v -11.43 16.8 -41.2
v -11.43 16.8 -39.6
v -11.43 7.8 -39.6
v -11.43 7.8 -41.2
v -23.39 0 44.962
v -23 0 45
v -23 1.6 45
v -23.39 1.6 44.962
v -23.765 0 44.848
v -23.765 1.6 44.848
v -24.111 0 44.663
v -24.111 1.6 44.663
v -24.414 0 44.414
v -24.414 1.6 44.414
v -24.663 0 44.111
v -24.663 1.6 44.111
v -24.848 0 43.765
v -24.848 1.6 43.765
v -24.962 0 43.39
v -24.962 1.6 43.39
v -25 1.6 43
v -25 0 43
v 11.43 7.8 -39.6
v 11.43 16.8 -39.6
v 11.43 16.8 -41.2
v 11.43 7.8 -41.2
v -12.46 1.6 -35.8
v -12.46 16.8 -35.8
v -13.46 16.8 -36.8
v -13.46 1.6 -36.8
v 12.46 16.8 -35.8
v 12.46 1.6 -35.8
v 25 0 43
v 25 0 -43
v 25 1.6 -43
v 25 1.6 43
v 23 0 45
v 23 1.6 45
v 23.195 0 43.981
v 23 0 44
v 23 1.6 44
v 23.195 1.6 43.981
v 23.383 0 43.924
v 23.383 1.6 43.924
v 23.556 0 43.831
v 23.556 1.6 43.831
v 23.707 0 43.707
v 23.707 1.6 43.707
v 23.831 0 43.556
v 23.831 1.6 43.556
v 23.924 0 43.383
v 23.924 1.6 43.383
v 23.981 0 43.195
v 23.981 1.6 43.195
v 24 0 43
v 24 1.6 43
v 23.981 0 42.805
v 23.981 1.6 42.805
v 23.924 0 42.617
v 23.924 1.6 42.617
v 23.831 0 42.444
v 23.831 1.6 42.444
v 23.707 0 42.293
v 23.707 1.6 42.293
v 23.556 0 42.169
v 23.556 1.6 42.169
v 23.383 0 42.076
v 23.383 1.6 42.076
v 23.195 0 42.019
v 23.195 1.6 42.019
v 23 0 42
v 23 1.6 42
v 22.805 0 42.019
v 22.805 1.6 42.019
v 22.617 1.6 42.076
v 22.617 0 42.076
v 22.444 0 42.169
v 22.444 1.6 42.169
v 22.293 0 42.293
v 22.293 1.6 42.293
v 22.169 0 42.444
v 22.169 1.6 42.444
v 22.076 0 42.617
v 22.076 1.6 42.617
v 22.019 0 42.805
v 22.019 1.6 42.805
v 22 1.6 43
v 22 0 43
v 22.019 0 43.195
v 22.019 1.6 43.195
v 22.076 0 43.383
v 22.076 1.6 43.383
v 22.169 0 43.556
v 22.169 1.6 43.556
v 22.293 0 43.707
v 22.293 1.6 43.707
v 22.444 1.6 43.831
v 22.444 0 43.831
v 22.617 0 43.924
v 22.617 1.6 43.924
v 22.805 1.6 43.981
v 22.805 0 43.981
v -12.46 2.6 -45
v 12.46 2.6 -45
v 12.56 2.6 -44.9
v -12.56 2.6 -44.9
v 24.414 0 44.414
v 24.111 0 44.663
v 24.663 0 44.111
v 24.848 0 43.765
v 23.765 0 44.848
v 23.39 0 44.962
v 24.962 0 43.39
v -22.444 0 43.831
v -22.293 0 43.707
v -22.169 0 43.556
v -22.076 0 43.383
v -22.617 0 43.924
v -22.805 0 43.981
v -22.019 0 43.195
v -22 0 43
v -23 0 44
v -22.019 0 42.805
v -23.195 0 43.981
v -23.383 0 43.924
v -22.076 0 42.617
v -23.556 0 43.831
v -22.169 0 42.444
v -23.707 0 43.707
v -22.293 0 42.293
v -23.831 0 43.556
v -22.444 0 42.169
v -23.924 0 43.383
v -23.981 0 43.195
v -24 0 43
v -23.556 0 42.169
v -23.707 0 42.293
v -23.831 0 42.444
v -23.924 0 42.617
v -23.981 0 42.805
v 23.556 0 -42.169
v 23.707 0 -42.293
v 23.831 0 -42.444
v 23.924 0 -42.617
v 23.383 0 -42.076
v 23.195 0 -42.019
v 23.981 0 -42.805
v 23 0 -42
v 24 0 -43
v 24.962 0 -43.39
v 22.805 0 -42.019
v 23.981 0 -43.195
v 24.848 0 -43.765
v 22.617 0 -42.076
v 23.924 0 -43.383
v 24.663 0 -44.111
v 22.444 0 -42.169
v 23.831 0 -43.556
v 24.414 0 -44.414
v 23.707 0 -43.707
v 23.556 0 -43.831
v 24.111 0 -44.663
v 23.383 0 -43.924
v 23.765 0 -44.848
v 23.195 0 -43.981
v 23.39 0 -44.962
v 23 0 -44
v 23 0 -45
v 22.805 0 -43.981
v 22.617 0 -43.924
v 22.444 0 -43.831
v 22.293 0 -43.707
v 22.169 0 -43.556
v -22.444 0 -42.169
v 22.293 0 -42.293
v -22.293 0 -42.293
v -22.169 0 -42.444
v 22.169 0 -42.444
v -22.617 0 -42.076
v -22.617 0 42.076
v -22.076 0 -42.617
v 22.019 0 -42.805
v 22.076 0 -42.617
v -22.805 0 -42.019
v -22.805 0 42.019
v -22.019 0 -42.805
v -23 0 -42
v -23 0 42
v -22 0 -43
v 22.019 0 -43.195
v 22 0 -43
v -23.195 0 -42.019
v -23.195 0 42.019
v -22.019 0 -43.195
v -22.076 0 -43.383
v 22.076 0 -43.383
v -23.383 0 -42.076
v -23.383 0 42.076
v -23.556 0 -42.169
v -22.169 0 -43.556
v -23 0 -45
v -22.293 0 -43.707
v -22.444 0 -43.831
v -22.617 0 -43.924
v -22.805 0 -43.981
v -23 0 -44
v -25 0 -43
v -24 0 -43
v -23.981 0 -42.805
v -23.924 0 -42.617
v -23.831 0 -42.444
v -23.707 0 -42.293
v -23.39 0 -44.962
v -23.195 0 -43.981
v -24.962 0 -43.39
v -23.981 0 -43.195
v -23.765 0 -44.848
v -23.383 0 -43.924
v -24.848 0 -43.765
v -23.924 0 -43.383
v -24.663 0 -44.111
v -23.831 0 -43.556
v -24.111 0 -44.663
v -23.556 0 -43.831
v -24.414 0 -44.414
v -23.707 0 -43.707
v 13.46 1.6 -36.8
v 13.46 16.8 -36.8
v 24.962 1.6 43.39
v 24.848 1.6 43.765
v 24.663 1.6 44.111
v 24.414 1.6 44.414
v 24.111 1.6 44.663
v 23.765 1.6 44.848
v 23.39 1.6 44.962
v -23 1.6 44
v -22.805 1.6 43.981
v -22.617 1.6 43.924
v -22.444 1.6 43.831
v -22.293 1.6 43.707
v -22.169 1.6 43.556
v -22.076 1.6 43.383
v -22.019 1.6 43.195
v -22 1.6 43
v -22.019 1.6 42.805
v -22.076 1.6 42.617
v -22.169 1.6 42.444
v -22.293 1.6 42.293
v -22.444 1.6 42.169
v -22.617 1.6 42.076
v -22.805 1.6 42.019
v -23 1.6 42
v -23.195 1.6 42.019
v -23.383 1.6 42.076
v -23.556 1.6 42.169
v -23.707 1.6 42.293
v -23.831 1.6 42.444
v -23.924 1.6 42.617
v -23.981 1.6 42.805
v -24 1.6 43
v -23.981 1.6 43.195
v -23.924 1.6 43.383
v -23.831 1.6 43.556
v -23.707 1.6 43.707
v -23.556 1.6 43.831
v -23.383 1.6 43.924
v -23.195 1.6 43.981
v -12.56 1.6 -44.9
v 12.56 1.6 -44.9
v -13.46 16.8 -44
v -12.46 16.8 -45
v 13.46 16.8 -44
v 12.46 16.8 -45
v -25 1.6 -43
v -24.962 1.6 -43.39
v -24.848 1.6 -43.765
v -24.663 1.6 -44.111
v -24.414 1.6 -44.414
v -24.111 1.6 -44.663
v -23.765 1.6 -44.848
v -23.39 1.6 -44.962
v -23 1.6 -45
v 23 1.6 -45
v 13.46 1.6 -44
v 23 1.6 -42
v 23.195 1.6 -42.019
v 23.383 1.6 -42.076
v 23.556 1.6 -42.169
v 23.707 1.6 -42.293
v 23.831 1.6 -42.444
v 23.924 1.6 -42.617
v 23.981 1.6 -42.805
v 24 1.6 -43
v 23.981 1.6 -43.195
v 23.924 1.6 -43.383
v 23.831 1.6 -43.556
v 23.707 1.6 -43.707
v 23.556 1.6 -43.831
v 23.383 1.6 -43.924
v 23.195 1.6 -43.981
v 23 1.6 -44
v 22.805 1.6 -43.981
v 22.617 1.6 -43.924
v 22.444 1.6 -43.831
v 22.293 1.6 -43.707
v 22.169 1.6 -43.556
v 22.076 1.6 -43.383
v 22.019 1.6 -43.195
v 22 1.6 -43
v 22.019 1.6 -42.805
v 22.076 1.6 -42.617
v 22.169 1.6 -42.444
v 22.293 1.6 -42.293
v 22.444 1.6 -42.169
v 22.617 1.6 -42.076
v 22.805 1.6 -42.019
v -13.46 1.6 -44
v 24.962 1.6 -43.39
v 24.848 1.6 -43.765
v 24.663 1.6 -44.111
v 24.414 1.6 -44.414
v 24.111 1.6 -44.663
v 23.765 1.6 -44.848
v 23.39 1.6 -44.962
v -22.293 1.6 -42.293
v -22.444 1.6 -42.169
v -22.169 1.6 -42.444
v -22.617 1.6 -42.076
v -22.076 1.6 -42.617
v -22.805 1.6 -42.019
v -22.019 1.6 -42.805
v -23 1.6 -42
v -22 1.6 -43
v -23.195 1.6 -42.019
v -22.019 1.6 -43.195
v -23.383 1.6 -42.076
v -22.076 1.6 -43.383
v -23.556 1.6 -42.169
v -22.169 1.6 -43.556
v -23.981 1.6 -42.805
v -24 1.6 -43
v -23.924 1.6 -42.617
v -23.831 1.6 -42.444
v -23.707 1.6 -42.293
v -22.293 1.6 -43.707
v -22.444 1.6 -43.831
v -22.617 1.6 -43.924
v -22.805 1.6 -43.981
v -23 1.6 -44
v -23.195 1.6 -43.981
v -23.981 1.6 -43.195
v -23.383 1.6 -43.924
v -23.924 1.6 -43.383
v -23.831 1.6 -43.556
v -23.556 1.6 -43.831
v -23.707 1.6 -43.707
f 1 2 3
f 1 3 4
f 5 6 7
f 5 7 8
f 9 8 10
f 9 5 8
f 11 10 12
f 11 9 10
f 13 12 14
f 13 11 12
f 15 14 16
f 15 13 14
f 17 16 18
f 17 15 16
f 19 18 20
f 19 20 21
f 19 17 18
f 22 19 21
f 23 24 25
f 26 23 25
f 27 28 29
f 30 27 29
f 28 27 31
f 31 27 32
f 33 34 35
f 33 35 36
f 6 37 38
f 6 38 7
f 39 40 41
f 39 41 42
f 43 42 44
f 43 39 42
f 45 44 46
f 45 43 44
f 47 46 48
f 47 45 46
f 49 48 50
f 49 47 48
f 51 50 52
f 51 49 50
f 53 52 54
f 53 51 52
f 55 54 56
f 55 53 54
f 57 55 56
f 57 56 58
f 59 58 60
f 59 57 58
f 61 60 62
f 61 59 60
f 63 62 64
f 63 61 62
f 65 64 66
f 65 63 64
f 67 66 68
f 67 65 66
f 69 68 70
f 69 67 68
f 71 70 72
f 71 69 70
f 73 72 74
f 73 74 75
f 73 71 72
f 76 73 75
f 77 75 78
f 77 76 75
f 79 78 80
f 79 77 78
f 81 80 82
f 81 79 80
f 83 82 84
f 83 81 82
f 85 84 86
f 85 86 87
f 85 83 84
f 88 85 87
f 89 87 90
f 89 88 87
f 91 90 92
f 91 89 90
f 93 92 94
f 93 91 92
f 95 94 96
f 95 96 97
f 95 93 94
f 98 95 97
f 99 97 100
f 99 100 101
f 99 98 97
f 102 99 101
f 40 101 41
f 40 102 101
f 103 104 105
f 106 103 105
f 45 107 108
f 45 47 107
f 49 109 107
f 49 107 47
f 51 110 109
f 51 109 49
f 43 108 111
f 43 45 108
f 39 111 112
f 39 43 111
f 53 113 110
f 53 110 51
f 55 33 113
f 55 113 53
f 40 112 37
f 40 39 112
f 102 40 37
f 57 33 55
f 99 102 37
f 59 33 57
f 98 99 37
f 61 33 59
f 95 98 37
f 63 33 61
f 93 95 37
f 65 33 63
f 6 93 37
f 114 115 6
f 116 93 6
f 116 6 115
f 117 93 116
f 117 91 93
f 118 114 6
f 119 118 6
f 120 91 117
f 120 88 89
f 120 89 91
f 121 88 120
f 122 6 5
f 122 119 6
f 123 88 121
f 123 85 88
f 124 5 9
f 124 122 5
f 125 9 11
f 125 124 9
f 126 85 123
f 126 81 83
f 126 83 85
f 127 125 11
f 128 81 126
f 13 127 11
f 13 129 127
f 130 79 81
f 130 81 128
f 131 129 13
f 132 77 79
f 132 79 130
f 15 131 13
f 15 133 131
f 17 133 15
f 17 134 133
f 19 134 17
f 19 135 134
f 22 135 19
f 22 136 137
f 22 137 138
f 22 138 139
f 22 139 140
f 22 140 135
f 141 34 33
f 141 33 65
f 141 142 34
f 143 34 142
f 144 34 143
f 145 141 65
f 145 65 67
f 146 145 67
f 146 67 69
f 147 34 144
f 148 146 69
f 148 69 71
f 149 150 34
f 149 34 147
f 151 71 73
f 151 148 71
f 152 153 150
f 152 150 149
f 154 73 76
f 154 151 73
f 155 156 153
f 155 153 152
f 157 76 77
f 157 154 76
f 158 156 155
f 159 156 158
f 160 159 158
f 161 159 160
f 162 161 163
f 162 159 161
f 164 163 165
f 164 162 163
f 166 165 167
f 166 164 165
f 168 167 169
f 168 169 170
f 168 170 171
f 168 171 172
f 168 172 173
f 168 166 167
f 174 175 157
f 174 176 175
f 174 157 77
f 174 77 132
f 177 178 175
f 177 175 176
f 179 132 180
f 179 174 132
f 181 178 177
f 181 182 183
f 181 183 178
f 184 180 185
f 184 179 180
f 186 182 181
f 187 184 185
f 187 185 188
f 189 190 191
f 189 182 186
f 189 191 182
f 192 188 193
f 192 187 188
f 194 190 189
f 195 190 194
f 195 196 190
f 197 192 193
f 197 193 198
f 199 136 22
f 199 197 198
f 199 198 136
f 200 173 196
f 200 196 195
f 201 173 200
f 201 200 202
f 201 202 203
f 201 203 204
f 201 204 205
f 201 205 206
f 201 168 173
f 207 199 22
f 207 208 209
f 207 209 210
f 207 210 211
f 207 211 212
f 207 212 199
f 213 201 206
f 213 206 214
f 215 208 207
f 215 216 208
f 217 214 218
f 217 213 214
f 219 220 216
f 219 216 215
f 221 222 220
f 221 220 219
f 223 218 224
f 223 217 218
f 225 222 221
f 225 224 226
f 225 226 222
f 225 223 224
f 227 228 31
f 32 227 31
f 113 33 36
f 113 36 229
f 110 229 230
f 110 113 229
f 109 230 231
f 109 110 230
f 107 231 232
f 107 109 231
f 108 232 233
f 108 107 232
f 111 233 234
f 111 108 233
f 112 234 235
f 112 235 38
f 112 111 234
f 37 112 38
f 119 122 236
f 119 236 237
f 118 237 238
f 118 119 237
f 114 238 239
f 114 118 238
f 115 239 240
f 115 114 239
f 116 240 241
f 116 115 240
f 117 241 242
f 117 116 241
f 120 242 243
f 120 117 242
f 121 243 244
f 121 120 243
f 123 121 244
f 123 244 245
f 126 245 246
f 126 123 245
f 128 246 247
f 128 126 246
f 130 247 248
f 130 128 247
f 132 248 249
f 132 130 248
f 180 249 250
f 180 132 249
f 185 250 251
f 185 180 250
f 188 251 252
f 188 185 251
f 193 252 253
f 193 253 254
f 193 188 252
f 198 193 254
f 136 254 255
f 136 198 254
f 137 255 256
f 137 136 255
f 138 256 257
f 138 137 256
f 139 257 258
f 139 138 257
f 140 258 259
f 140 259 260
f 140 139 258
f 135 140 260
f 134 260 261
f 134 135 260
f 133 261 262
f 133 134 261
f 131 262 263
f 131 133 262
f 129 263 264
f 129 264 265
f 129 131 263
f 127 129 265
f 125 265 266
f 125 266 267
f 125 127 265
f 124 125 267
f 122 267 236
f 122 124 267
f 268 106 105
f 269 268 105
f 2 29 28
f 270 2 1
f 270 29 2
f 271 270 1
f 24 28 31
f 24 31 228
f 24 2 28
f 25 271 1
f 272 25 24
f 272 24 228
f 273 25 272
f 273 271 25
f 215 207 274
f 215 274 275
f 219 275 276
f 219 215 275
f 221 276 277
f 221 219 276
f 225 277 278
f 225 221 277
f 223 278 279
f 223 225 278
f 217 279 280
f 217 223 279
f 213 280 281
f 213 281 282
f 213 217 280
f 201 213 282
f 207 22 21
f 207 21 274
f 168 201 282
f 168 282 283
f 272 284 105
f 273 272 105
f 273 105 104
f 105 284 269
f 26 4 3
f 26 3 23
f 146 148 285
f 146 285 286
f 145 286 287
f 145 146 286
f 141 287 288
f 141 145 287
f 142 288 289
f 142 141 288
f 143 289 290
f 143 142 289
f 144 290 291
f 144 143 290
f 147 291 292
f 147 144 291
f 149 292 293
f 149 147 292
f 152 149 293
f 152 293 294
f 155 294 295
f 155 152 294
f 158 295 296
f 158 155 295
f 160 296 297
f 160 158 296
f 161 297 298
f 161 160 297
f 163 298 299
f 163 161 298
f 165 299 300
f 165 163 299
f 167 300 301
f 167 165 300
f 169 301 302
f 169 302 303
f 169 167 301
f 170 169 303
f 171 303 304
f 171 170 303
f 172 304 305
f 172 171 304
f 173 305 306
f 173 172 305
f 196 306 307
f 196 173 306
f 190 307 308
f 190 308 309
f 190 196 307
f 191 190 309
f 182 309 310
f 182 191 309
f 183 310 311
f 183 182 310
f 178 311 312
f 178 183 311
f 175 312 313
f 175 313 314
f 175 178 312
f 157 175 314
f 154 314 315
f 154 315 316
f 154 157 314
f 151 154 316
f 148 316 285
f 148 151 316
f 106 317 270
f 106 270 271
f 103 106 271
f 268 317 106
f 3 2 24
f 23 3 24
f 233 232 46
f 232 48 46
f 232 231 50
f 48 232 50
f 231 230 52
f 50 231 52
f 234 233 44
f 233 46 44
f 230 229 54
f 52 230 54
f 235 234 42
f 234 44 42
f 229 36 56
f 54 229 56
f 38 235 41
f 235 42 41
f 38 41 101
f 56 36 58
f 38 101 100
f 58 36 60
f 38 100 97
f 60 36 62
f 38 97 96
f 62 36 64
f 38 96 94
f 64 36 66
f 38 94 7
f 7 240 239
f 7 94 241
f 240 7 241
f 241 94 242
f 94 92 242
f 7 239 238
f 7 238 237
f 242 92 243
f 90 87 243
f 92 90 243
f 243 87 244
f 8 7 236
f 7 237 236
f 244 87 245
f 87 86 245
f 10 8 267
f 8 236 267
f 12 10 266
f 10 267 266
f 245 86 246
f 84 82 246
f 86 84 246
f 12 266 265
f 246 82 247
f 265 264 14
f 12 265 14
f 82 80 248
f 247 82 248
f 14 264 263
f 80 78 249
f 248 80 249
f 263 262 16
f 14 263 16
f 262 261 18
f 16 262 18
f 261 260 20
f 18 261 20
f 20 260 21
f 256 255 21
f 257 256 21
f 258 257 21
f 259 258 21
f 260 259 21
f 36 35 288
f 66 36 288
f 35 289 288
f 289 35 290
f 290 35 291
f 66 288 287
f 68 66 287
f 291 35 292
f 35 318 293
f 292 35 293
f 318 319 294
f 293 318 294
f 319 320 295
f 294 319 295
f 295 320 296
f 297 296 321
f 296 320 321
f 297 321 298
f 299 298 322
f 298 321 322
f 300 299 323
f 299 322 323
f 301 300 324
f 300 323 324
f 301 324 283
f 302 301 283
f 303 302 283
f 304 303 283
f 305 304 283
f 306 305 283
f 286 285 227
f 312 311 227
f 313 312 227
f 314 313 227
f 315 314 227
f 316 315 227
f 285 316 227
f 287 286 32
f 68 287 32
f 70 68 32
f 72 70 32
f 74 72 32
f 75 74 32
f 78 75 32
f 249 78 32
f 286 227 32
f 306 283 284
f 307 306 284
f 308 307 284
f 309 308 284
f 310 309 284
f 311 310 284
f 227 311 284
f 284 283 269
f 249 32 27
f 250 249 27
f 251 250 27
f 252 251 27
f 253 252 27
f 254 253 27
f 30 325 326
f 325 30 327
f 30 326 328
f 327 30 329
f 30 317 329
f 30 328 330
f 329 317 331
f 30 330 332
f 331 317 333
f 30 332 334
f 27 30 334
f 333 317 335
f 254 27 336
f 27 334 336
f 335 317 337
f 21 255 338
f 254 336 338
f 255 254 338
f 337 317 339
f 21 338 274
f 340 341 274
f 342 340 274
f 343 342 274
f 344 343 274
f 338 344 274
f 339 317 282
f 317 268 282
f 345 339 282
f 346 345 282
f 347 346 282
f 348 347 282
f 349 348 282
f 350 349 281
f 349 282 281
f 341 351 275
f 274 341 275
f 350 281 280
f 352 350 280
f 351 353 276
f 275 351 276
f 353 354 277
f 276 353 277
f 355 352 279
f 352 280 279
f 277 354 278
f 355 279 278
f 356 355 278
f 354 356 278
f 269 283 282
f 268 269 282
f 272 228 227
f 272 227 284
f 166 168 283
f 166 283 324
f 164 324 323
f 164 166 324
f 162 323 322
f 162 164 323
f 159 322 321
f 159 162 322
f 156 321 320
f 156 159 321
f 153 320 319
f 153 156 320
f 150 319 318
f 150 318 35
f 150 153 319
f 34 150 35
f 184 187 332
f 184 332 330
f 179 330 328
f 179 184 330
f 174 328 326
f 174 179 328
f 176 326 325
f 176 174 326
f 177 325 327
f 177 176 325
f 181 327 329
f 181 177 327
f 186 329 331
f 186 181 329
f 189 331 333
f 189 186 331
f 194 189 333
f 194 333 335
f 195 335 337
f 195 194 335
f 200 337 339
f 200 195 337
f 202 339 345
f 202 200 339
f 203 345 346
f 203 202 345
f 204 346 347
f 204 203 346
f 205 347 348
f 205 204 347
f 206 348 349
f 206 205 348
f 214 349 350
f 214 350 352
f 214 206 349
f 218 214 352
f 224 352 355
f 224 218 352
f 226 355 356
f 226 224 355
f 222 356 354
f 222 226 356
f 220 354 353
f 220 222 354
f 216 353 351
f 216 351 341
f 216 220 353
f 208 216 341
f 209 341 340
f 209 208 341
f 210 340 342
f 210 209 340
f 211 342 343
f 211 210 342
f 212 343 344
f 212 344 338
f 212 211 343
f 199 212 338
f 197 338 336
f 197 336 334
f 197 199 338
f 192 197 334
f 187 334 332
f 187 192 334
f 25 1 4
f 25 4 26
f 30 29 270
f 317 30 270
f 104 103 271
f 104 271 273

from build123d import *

# Parameters (mm, degrees)
SKETCH_1_R          = 1
EXTRUDE_1_DEPTH     = 1.6
EXTRUDE_START       = 1.6
SKETCH_2_W          = 26.92
SKETCH_2_H          = 9.2
EXTRUDE_2_DEPTH     = 15.2
CUT_EXTRUDE_START   = 16.8
SKETCH_3_W          = 22.86
SKETCH_3_H          = 1.6
CUT_EXTRUDE_1_DEPTH = 9
CUT_EXTRUDE_START_2 = -45
SKETCH_4_W          = 26.92
SKETCH_4_H          = 1
CUT_EXTRUDE_2_DEPTH = 0.1
CUT_EXTRUDE_START_3 = 1.6
CUT_EXTRUDE_3_DEPTH = 15.2


with BuildPart() as part:
    # 草图1 → 凸台-拉伸1 (new body)
    with BuildSketch(Plane(origin=(0, 0, 0), x_dir=(1, 0, 0), z_dir=(0, 1, 0))):
        with BuildLine():
            Line((-23, 45), (23, 45))
            ThreePointArc((23, 45), (24.414213562, 44.414213562), (25, 43))
            Line((25, 43), (25, -43))
            ThreePointArc((25, -43), (24.414213562, -44.414213562), (23, -45))
            Line((23, -45), (-23, -45))
            ThreePointArc((-23, -45), (-24.414213562, -44.414213562), (-25, -43))
            Line((-25, -43), (-25, 43))
            ThreePointArc((-25, 43), (-24.414213562, 44.414213562), (-23, 45))
        make_face()
        with Locations(Location((-23, 43, 0), (0, 0, 270))):
            Circle(SKETCH_1_R, mode=Mode.SUBTRACT)
        with Locations(Location((23, 43, 0), (0, 0, 270))):
            Circle(SKETCH_1_R, mode=Mode.SUBTRACT)
        with Locations(Location((-23, -43, 0), (0, 0, 270))):
            Circle(SKETCH_1_R, mode=Mode.SUBTRACT)
        with Locations(Location((23, -43, 0), (0, 0, 270))):
            Circle(SKETCH_1_R, mode=Mode.SUBTRACT)
    extrude(amount=EXTRUDE_1_DEPTH)

    # 草图2 → 凸台-拉伸2 (add)
    with BuildSketch(Plane(origin=(0, 0, 0), x_dir=(1, 0, 0), z_dir=(0, 1, 0)).offset(EXTRUDE_START)):
        with Locations((0, 40.4)):
            Rectangle(SKETCH_2_W, SKETCH_2_H)
    extrude(amount=EXTRUDE_2_DEPTH)

    # 草图3 → 切除-拉伸1 (cut)
    with BuildSketch(Plane(origin=(0, 0, 0), x_dir=(1, 0, 0), z_dir=(0, 1, 0)).offset(CUT_EXTRUDE_START)):
        with Locations((0, 40.4)):
            Rectangle(SKETCH_3_W, SKETCH_3_H)
    extrude(amount=-CUT_EXTRUDE_1_DEPTH, mode=Mode.SUBTRACT)

    # 草图4 → 切除-拉伸2 (cut)
    with BuildSketch(Plane.XY.offset(CUT_EXTRUDE_START_2)):
        with Locations((0, 2.1)):
            Rectangle(SKETCH_4_W, SKETCH_4_H)
    extrude(amount=CUT_EXTRUDE_2_DEPTH, mode=Mode.SUBTRACT)

    # 草图5 → 切除-拉伸3 (cut)
    with BuildSketch(Plane(origin=(0, 0, 0), x_dir=(1, 0, 0), z_dir=(0, 1, 0)).offset(CUT_EXTRUDE_START_3)):
        Polygon((13.46, 35.8), (13.46, 36.8), (12.46, 35.8), align=None)
        Polygon((13.46, 45), (13.46, 44), (12.46, 45), align=None)
        Polygon((-13.46, 45), (-13.46, 44), (-12.46, 45), align=None)
        Polygon((-13.46, 35.8), (-12.46, 35.8), (-13.46, 36.8), align=None)
    extrude(amount=CUT_EXTRUDE_3_DEPTH, mode=Mode.SUBTRACT)


solid = part.part
